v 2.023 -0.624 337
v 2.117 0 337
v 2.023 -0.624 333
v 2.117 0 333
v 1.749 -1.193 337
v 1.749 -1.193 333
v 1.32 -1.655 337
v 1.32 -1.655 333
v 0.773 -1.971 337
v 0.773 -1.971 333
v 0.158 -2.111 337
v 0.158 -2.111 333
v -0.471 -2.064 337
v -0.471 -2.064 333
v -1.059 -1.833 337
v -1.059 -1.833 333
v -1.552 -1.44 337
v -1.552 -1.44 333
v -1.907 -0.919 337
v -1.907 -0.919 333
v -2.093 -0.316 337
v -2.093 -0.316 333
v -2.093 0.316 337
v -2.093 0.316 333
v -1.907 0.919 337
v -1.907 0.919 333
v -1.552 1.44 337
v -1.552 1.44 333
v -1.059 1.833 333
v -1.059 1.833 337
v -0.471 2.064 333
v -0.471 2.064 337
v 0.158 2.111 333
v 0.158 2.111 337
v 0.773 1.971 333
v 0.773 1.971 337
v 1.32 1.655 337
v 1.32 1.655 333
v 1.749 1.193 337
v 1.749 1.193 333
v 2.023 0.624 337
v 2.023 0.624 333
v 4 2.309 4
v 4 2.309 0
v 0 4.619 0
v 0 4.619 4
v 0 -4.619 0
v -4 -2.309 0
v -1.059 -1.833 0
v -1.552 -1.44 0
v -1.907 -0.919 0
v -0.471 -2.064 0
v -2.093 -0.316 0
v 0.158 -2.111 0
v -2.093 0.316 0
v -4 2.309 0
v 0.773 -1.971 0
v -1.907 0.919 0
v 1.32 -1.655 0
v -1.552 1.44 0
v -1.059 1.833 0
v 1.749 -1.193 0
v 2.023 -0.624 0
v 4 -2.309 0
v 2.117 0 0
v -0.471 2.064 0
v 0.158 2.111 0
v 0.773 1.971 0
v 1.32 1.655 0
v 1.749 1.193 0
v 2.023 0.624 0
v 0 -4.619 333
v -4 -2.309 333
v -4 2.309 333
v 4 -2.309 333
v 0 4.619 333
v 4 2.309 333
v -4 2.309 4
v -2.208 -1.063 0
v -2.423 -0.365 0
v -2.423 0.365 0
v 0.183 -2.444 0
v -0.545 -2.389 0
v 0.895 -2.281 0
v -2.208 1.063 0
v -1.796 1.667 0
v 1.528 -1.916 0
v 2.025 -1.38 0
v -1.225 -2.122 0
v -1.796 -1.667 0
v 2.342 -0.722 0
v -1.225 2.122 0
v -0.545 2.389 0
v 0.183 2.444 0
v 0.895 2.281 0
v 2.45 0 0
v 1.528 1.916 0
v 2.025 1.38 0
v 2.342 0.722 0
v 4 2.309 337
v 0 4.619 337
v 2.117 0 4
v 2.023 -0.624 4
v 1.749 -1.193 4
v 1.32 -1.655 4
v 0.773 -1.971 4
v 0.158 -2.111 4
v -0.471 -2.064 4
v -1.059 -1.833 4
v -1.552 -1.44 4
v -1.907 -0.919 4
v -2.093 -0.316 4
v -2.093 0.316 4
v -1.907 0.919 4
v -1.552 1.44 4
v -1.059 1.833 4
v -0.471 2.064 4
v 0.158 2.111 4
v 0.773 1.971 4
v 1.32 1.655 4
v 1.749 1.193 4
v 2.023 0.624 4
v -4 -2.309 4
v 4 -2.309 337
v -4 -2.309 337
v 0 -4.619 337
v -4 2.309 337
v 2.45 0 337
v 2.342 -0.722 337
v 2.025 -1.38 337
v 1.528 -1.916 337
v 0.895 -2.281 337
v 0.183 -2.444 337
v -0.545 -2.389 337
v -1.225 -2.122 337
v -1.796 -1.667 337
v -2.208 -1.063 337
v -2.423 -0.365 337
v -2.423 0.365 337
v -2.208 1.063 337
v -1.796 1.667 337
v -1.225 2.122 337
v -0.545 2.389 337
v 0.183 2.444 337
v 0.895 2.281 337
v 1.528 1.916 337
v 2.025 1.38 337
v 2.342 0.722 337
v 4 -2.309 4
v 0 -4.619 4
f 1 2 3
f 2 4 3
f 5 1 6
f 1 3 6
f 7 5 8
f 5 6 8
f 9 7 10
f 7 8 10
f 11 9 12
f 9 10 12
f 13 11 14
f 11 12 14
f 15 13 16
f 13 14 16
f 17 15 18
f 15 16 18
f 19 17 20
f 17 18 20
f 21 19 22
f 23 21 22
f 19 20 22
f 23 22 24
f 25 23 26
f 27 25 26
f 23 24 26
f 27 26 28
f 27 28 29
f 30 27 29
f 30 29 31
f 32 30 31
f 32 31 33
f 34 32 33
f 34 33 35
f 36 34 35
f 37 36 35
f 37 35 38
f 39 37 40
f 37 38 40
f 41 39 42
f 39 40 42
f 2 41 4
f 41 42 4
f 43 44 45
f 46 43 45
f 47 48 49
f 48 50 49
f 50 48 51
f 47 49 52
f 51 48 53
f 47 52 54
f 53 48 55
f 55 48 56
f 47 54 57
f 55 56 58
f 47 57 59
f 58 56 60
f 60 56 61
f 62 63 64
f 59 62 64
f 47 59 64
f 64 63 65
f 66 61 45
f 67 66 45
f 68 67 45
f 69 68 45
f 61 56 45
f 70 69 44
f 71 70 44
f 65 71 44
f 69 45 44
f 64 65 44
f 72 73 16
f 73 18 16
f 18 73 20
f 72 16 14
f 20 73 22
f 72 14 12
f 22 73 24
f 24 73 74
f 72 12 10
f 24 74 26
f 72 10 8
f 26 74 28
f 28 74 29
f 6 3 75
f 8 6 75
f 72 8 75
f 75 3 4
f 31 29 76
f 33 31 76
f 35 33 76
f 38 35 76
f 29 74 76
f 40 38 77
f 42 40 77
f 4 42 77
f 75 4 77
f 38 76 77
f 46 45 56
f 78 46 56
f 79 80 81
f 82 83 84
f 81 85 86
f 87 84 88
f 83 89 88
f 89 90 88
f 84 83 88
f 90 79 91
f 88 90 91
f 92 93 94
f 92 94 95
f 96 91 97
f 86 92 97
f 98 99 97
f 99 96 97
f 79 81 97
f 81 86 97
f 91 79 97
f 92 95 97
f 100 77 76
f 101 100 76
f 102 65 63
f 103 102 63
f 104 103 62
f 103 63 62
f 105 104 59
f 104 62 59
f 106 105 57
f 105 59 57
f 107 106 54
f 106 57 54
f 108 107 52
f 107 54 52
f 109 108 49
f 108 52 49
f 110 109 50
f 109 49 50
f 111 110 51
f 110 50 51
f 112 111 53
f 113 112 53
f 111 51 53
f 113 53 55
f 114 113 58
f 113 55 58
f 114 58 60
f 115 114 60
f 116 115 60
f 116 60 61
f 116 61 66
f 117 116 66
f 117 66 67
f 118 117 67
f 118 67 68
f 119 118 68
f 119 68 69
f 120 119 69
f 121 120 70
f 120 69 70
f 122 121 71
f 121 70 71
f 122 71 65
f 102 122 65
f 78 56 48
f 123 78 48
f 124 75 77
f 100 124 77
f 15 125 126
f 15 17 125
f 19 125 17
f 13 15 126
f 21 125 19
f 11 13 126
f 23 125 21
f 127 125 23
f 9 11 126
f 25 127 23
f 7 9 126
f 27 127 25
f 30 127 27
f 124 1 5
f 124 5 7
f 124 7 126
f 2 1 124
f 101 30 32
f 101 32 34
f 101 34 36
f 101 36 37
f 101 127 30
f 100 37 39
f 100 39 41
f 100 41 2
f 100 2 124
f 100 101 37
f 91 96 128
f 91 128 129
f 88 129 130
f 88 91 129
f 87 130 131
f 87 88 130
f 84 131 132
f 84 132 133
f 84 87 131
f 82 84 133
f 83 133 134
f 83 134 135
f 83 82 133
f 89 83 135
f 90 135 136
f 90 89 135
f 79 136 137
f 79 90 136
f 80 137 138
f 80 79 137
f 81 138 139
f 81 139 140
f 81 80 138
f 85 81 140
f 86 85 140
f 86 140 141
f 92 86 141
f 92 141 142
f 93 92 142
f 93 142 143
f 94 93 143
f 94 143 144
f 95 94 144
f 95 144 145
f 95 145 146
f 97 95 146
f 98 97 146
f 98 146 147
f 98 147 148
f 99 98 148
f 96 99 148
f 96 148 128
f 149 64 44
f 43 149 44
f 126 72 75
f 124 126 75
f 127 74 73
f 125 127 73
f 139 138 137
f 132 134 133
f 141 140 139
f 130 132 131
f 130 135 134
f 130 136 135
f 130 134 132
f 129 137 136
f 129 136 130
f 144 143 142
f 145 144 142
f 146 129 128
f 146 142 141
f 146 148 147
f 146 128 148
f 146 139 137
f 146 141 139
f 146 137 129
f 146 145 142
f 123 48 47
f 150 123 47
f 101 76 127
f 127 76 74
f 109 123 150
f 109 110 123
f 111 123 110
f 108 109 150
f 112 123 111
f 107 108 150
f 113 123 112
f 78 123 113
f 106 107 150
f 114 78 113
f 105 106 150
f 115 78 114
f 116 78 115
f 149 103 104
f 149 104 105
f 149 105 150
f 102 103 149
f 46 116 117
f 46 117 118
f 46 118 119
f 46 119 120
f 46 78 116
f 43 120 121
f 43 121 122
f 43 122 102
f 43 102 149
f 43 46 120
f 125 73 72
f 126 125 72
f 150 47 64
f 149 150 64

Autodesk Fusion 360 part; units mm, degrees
sketch "Esquisse1" plane through (0, 0, 0) normal (0, 0, 1) x (1, 0, 0) in component "threaded shaft"
  circle A0 centre (0, 0) radius 2.5
  dimension "d1" = 5
extrude "Extrusion1" add sketch "Esquisse1" along normal blind 337 makes body 1 in component "threaded shaft"
thread "Filetage1" "ISO Metric profile 5.0 M5x0.8 6g" major diameter 4.901 minor diameter 3.9895 pitch 0.8 angle 60 resizes the face on face at (2.4905, -0.2179, 224.6667) on bodies 1 in component "threaded shaft"
sketch "Esquisse2" plane through (0, 0, 0) normal (0, 0, 1) x (1, 0, 0) in component "Bolt"
  circle A0 centre (0, 0) radius 2.5
  circle A1 centre (0, 0) radius 4 construction
  line L0 (4, 2.3094) -> (0, 4.6188)
  line L1 (0, 4.6188) -> (-4, 2.3094)
  line L2 (-4, 2.3094) -> (-4, -2.3094)
  line L3 (-4, -2.3094) -> (0, -4.6188)
  line L4 (0, -4.6188) -> (4, -2.3094)
  line L5 (4, -2.3094) -> (4, 2.3094)
  dimension "d4" = 5
  dimension "d5" = 8
  dimension "d6" = 8
extrude "Extrusion2" add sketch "Esquisse2" along normal blind 4 separate body makes body 2 in component "Bolt"
copy_body "CutPasteBodies1" bodies 2 removing the originals makes body 3 in component "Bolt"
thread "Filetage1'" "ISO Metric profile 5.0 M5x0.8 6H" major diameter 5.12 minor diameter 4.234 pitch 0.8 angle 60 resizes the face on face at (2.4969, -0.1246, 2.6667) on bodies 3 in component "Bolt"
component "threaded shaft" placed x (1, 0, 0) y (0, 1, 0) z (0, 0, 1) at (0, 0, 0)
component "Bolt" placed x (1, 0, 0) y (0, 1, 0) z (0, 0, 1) at (0, 0, 0)
component "Bolt" placed x (1, 0, 0) y (0, 1, 0) z (0, 0, 1) at (0, 0, 333)
equation "d6 = d5"
